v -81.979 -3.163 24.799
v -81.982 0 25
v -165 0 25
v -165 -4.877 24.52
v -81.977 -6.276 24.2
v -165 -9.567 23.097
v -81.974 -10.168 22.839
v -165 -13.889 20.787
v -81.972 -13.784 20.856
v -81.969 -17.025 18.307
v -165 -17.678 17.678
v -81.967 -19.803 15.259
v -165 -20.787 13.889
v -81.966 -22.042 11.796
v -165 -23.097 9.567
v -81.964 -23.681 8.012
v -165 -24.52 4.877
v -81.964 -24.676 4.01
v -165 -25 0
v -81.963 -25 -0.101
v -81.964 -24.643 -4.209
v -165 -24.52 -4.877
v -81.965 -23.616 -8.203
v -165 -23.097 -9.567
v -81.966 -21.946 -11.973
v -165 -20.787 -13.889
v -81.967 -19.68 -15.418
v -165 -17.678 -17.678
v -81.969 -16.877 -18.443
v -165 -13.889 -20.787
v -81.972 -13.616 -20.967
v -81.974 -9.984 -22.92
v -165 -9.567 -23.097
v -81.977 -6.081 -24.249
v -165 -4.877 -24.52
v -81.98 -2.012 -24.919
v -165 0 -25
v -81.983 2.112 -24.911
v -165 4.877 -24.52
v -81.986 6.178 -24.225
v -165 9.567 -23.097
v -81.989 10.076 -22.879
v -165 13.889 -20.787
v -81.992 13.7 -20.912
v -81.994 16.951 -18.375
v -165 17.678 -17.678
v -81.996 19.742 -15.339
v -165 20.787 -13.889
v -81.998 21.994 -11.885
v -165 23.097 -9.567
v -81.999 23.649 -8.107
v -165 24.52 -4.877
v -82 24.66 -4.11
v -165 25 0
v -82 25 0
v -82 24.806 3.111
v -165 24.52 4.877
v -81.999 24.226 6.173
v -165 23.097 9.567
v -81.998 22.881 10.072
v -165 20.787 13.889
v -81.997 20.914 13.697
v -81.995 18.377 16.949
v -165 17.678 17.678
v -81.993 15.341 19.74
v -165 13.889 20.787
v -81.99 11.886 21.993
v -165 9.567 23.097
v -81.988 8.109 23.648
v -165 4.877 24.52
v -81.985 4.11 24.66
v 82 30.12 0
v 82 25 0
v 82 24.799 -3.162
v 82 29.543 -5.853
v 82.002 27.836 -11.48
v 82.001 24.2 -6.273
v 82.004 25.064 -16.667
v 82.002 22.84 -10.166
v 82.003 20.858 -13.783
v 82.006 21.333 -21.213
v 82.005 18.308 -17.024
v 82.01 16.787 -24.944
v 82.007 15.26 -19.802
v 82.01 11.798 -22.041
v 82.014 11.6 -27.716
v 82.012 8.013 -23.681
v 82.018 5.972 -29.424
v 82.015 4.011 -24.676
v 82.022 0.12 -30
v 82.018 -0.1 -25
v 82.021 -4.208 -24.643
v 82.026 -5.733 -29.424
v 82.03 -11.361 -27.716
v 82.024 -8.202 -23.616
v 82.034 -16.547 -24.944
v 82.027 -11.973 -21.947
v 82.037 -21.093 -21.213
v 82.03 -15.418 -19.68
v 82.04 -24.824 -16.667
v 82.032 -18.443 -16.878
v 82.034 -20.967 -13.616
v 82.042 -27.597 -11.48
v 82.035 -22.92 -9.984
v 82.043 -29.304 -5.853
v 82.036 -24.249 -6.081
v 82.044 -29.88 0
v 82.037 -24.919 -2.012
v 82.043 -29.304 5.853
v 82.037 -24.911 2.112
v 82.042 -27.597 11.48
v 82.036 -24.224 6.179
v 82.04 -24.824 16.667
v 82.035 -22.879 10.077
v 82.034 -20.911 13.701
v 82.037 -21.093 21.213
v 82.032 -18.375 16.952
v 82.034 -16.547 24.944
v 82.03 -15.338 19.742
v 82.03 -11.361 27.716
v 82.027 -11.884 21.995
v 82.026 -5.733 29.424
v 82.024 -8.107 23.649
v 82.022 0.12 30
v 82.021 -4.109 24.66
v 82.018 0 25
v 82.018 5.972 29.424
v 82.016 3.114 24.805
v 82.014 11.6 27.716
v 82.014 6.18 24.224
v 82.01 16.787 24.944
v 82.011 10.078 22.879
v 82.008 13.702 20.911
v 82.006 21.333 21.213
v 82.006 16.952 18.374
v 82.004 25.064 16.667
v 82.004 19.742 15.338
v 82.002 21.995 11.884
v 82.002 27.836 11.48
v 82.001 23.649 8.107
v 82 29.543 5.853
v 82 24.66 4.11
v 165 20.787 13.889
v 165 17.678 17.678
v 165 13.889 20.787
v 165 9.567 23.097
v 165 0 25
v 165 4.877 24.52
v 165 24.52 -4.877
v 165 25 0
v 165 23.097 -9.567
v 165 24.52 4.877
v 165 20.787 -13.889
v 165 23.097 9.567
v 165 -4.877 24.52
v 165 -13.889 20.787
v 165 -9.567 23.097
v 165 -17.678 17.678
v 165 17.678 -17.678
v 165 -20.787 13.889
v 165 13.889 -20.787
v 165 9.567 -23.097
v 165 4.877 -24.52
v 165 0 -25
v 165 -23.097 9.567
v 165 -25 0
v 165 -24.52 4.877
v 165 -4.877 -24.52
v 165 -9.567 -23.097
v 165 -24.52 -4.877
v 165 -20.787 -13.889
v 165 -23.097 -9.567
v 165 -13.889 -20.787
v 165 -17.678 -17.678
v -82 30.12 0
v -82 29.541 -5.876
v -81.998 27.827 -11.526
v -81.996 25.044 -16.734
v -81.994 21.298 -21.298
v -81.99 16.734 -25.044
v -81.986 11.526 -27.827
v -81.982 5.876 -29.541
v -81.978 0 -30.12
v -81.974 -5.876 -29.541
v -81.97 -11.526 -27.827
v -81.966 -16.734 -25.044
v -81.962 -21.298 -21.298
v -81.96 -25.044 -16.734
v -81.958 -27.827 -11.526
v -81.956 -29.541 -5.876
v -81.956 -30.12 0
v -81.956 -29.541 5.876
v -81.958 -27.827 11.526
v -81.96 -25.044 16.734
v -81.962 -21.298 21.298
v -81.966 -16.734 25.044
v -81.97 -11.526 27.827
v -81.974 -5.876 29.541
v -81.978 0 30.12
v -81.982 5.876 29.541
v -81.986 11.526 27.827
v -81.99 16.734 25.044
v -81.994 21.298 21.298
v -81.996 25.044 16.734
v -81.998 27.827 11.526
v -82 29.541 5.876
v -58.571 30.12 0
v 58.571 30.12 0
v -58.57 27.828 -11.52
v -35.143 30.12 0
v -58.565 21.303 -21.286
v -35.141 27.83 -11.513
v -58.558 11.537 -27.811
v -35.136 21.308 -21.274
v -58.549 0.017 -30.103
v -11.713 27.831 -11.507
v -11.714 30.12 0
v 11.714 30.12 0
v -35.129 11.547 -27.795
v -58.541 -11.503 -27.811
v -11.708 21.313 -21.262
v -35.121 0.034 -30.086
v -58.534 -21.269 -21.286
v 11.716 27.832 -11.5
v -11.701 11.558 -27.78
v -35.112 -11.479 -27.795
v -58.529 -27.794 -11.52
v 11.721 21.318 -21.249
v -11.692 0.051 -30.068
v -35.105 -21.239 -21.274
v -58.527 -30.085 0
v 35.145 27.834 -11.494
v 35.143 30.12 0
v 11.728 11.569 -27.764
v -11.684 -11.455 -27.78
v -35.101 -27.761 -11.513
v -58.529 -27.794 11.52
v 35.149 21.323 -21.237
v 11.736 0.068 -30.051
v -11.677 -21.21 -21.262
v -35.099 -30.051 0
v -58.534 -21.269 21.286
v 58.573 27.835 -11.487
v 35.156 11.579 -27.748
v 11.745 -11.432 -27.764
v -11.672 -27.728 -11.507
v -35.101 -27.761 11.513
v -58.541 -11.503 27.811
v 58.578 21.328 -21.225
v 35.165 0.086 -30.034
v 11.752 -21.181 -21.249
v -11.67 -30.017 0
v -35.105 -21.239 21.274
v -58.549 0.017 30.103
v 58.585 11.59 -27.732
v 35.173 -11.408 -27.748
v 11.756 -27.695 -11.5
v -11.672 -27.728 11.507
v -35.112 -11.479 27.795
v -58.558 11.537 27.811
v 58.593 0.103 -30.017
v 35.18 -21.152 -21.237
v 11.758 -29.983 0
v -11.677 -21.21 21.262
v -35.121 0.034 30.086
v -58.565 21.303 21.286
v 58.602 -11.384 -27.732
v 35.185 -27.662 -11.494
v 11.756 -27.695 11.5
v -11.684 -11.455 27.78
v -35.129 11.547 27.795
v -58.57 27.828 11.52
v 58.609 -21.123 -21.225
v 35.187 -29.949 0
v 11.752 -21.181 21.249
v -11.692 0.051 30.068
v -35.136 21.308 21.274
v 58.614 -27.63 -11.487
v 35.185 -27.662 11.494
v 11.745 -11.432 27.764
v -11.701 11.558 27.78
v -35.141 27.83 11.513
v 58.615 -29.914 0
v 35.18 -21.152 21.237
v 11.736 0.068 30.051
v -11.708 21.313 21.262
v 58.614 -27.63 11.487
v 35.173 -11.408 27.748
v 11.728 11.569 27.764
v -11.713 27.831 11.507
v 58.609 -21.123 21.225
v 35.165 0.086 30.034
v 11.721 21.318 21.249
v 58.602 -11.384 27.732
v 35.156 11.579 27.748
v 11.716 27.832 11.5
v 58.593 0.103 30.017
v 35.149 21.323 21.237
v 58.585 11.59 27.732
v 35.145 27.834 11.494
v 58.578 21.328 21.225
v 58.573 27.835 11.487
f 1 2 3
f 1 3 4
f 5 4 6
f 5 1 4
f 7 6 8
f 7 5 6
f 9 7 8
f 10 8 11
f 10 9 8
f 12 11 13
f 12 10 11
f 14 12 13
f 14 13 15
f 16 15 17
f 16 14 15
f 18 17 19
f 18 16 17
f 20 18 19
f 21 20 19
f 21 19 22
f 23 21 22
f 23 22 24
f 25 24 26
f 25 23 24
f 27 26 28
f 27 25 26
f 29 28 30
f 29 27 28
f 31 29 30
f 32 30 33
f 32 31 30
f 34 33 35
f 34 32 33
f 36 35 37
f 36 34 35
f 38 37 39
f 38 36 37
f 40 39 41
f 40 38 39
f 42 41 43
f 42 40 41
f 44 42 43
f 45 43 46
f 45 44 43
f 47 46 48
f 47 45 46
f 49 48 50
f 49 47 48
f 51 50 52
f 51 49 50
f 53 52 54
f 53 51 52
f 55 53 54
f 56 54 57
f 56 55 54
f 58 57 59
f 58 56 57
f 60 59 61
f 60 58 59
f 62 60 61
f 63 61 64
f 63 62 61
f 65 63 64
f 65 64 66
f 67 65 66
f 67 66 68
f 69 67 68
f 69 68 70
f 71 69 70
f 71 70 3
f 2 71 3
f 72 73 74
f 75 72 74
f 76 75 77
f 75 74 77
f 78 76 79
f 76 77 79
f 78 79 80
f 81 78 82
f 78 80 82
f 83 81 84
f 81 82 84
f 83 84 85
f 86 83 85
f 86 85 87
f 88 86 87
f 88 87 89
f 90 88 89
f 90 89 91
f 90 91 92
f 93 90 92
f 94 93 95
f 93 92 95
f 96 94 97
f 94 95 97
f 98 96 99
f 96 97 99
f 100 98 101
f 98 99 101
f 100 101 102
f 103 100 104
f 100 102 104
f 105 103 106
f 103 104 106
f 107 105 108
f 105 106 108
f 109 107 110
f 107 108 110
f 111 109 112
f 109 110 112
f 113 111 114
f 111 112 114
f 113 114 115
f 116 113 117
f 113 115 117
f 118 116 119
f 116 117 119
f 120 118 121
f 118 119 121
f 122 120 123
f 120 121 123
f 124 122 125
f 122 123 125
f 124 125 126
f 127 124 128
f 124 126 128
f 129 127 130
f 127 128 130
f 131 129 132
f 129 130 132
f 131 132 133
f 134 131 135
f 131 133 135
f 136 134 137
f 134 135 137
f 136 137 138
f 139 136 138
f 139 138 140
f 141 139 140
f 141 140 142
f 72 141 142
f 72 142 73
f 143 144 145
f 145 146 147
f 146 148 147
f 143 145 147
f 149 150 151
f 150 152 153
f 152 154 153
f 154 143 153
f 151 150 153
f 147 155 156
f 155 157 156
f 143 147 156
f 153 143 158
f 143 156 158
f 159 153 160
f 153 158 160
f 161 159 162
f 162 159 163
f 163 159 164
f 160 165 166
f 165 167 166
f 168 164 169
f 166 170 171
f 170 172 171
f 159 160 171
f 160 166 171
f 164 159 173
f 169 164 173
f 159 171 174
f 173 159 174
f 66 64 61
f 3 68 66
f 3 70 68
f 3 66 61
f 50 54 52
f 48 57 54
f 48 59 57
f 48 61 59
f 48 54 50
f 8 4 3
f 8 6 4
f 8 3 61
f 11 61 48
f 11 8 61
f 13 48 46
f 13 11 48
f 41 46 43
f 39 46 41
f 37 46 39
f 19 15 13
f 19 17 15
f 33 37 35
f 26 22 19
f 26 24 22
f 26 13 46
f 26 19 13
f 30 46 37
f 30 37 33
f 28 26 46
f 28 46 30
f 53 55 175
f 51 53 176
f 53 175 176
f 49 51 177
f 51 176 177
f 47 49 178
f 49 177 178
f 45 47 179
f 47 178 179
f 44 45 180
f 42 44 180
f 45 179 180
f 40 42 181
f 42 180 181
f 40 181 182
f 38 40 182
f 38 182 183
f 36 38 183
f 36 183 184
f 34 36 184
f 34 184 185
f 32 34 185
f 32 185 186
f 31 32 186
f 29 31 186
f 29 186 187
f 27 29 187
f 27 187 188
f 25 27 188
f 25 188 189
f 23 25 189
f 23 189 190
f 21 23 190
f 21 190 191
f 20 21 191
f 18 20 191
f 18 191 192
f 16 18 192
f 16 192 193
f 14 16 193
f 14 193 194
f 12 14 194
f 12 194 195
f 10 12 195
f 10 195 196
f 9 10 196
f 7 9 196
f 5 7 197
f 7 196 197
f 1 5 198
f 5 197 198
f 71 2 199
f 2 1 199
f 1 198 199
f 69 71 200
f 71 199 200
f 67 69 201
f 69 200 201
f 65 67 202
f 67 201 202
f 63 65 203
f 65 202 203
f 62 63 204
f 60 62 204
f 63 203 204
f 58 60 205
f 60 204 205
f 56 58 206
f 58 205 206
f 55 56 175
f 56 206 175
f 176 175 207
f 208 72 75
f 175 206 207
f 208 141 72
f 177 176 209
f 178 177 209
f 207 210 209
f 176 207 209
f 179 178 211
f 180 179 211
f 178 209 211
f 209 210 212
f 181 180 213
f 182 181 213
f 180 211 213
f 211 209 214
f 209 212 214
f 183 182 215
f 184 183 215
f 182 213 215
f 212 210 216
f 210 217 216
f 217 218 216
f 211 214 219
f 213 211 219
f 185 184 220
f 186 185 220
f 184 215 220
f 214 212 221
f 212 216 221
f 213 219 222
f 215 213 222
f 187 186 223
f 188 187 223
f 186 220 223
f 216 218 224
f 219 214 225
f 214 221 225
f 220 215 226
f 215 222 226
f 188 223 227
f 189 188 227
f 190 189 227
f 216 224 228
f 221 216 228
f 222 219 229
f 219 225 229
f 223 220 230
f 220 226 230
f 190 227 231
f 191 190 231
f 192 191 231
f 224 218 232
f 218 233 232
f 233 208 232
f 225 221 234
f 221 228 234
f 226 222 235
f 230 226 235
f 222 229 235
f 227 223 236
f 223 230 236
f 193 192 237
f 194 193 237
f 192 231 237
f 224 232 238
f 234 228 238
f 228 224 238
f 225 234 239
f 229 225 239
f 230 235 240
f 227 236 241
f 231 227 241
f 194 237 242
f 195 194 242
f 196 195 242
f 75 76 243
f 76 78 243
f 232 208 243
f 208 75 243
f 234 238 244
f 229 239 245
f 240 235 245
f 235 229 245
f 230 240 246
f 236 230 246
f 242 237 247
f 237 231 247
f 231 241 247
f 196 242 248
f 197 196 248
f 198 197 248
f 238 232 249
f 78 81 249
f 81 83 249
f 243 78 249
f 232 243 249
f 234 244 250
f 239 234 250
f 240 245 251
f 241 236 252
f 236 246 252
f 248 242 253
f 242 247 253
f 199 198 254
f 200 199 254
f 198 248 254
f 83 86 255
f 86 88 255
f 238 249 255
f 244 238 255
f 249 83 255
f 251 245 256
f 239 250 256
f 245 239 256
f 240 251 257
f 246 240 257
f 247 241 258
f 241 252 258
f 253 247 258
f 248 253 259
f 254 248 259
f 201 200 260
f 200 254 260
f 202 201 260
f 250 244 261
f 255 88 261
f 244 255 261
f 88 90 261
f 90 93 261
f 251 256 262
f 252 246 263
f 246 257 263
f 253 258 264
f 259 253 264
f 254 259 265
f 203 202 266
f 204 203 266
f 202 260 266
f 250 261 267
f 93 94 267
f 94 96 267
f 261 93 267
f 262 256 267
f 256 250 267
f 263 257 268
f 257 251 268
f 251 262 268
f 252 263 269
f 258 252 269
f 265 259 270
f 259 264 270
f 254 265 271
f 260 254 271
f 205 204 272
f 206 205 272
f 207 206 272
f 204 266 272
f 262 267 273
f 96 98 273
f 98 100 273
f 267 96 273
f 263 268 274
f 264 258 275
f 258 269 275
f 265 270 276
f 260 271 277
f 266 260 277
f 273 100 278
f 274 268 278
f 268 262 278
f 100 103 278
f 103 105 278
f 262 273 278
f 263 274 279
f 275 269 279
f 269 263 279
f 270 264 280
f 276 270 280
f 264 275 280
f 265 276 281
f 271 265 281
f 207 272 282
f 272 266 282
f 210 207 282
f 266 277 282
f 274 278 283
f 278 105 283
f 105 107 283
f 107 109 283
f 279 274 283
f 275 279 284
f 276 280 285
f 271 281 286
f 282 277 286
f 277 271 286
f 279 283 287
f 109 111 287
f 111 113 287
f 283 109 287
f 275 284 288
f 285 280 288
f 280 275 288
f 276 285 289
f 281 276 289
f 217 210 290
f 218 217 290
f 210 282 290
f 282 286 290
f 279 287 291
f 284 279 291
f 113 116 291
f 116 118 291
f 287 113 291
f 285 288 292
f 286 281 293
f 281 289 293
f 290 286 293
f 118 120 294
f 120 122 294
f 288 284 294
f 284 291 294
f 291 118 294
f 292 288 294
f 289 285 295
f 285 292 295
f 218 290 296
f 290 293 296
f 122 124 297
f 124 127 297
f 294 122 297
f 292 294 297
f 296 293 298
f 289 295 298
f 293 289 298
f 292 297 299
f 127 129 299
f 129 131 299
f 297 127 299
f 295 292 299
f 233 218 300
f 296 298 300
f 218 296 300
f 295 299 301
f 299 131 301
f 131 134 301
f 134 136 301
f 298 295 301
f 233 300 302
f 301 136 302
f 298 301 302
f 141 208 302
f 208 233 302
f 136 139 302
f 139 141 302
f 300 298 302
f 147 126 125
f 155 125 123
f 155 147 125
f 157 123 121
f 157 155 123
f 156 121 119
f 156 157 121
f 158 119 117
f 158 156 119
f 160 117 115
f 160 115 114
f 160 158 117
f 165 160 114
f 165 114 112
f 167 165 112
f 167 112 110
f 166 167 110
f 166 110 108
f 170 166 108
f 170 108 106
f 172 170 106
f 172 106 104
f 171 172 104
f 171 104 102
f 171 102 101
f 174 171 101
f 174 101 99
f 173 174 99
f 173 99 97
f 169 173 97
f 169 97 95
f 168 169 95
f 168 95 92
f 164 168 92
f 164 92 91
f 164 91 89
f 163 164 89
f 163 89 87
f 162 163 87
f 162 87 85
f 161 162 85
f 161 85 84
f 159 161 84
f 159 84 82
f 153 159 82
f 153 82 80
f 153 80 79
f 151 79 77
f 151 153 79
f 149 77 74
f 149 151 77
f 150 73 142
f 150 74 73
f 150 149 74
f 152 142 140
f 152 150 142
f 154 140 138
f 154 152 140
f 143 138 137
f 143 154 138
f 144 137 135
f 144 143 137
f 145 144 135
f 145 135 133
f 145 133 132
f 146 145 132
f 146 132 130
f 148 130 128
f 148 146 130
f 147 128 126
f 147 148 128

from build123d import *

# Parameters (mm, degrees)
SKETCH1_W = 330
SKETCH1_H = 25


with BuildPart() as part:
    # Sketch1 → Revolve1 (revolve)
    with BuildSketch(Plane.XY, mode=Mode.PRIVATE) as revolve1_sk:
        with Locations((0, 12.5)):
            Rectangle(SKETCH1_W, SKETCH1_H)
    revolve(revolve1_sk.sketch.rotate(Axis((-165, 0, 0), (1, 0, 0)), 90), axis=Axis((-165, 0, 0), (1, 0, 0)))

    # Sketch2 → Revolve2 (revolve)
    with BuildSketch(Plane.XY):
        Polygon((-82, 0), (-82, 30.119743804), (82, 30.119743804), (82, 0.119743804), align=None)
    revolve(axis=Axis((82, 0.119743804, 0), (-0.9999997334441394, -0.0007301449514384814, 0)))


solid = part.part
